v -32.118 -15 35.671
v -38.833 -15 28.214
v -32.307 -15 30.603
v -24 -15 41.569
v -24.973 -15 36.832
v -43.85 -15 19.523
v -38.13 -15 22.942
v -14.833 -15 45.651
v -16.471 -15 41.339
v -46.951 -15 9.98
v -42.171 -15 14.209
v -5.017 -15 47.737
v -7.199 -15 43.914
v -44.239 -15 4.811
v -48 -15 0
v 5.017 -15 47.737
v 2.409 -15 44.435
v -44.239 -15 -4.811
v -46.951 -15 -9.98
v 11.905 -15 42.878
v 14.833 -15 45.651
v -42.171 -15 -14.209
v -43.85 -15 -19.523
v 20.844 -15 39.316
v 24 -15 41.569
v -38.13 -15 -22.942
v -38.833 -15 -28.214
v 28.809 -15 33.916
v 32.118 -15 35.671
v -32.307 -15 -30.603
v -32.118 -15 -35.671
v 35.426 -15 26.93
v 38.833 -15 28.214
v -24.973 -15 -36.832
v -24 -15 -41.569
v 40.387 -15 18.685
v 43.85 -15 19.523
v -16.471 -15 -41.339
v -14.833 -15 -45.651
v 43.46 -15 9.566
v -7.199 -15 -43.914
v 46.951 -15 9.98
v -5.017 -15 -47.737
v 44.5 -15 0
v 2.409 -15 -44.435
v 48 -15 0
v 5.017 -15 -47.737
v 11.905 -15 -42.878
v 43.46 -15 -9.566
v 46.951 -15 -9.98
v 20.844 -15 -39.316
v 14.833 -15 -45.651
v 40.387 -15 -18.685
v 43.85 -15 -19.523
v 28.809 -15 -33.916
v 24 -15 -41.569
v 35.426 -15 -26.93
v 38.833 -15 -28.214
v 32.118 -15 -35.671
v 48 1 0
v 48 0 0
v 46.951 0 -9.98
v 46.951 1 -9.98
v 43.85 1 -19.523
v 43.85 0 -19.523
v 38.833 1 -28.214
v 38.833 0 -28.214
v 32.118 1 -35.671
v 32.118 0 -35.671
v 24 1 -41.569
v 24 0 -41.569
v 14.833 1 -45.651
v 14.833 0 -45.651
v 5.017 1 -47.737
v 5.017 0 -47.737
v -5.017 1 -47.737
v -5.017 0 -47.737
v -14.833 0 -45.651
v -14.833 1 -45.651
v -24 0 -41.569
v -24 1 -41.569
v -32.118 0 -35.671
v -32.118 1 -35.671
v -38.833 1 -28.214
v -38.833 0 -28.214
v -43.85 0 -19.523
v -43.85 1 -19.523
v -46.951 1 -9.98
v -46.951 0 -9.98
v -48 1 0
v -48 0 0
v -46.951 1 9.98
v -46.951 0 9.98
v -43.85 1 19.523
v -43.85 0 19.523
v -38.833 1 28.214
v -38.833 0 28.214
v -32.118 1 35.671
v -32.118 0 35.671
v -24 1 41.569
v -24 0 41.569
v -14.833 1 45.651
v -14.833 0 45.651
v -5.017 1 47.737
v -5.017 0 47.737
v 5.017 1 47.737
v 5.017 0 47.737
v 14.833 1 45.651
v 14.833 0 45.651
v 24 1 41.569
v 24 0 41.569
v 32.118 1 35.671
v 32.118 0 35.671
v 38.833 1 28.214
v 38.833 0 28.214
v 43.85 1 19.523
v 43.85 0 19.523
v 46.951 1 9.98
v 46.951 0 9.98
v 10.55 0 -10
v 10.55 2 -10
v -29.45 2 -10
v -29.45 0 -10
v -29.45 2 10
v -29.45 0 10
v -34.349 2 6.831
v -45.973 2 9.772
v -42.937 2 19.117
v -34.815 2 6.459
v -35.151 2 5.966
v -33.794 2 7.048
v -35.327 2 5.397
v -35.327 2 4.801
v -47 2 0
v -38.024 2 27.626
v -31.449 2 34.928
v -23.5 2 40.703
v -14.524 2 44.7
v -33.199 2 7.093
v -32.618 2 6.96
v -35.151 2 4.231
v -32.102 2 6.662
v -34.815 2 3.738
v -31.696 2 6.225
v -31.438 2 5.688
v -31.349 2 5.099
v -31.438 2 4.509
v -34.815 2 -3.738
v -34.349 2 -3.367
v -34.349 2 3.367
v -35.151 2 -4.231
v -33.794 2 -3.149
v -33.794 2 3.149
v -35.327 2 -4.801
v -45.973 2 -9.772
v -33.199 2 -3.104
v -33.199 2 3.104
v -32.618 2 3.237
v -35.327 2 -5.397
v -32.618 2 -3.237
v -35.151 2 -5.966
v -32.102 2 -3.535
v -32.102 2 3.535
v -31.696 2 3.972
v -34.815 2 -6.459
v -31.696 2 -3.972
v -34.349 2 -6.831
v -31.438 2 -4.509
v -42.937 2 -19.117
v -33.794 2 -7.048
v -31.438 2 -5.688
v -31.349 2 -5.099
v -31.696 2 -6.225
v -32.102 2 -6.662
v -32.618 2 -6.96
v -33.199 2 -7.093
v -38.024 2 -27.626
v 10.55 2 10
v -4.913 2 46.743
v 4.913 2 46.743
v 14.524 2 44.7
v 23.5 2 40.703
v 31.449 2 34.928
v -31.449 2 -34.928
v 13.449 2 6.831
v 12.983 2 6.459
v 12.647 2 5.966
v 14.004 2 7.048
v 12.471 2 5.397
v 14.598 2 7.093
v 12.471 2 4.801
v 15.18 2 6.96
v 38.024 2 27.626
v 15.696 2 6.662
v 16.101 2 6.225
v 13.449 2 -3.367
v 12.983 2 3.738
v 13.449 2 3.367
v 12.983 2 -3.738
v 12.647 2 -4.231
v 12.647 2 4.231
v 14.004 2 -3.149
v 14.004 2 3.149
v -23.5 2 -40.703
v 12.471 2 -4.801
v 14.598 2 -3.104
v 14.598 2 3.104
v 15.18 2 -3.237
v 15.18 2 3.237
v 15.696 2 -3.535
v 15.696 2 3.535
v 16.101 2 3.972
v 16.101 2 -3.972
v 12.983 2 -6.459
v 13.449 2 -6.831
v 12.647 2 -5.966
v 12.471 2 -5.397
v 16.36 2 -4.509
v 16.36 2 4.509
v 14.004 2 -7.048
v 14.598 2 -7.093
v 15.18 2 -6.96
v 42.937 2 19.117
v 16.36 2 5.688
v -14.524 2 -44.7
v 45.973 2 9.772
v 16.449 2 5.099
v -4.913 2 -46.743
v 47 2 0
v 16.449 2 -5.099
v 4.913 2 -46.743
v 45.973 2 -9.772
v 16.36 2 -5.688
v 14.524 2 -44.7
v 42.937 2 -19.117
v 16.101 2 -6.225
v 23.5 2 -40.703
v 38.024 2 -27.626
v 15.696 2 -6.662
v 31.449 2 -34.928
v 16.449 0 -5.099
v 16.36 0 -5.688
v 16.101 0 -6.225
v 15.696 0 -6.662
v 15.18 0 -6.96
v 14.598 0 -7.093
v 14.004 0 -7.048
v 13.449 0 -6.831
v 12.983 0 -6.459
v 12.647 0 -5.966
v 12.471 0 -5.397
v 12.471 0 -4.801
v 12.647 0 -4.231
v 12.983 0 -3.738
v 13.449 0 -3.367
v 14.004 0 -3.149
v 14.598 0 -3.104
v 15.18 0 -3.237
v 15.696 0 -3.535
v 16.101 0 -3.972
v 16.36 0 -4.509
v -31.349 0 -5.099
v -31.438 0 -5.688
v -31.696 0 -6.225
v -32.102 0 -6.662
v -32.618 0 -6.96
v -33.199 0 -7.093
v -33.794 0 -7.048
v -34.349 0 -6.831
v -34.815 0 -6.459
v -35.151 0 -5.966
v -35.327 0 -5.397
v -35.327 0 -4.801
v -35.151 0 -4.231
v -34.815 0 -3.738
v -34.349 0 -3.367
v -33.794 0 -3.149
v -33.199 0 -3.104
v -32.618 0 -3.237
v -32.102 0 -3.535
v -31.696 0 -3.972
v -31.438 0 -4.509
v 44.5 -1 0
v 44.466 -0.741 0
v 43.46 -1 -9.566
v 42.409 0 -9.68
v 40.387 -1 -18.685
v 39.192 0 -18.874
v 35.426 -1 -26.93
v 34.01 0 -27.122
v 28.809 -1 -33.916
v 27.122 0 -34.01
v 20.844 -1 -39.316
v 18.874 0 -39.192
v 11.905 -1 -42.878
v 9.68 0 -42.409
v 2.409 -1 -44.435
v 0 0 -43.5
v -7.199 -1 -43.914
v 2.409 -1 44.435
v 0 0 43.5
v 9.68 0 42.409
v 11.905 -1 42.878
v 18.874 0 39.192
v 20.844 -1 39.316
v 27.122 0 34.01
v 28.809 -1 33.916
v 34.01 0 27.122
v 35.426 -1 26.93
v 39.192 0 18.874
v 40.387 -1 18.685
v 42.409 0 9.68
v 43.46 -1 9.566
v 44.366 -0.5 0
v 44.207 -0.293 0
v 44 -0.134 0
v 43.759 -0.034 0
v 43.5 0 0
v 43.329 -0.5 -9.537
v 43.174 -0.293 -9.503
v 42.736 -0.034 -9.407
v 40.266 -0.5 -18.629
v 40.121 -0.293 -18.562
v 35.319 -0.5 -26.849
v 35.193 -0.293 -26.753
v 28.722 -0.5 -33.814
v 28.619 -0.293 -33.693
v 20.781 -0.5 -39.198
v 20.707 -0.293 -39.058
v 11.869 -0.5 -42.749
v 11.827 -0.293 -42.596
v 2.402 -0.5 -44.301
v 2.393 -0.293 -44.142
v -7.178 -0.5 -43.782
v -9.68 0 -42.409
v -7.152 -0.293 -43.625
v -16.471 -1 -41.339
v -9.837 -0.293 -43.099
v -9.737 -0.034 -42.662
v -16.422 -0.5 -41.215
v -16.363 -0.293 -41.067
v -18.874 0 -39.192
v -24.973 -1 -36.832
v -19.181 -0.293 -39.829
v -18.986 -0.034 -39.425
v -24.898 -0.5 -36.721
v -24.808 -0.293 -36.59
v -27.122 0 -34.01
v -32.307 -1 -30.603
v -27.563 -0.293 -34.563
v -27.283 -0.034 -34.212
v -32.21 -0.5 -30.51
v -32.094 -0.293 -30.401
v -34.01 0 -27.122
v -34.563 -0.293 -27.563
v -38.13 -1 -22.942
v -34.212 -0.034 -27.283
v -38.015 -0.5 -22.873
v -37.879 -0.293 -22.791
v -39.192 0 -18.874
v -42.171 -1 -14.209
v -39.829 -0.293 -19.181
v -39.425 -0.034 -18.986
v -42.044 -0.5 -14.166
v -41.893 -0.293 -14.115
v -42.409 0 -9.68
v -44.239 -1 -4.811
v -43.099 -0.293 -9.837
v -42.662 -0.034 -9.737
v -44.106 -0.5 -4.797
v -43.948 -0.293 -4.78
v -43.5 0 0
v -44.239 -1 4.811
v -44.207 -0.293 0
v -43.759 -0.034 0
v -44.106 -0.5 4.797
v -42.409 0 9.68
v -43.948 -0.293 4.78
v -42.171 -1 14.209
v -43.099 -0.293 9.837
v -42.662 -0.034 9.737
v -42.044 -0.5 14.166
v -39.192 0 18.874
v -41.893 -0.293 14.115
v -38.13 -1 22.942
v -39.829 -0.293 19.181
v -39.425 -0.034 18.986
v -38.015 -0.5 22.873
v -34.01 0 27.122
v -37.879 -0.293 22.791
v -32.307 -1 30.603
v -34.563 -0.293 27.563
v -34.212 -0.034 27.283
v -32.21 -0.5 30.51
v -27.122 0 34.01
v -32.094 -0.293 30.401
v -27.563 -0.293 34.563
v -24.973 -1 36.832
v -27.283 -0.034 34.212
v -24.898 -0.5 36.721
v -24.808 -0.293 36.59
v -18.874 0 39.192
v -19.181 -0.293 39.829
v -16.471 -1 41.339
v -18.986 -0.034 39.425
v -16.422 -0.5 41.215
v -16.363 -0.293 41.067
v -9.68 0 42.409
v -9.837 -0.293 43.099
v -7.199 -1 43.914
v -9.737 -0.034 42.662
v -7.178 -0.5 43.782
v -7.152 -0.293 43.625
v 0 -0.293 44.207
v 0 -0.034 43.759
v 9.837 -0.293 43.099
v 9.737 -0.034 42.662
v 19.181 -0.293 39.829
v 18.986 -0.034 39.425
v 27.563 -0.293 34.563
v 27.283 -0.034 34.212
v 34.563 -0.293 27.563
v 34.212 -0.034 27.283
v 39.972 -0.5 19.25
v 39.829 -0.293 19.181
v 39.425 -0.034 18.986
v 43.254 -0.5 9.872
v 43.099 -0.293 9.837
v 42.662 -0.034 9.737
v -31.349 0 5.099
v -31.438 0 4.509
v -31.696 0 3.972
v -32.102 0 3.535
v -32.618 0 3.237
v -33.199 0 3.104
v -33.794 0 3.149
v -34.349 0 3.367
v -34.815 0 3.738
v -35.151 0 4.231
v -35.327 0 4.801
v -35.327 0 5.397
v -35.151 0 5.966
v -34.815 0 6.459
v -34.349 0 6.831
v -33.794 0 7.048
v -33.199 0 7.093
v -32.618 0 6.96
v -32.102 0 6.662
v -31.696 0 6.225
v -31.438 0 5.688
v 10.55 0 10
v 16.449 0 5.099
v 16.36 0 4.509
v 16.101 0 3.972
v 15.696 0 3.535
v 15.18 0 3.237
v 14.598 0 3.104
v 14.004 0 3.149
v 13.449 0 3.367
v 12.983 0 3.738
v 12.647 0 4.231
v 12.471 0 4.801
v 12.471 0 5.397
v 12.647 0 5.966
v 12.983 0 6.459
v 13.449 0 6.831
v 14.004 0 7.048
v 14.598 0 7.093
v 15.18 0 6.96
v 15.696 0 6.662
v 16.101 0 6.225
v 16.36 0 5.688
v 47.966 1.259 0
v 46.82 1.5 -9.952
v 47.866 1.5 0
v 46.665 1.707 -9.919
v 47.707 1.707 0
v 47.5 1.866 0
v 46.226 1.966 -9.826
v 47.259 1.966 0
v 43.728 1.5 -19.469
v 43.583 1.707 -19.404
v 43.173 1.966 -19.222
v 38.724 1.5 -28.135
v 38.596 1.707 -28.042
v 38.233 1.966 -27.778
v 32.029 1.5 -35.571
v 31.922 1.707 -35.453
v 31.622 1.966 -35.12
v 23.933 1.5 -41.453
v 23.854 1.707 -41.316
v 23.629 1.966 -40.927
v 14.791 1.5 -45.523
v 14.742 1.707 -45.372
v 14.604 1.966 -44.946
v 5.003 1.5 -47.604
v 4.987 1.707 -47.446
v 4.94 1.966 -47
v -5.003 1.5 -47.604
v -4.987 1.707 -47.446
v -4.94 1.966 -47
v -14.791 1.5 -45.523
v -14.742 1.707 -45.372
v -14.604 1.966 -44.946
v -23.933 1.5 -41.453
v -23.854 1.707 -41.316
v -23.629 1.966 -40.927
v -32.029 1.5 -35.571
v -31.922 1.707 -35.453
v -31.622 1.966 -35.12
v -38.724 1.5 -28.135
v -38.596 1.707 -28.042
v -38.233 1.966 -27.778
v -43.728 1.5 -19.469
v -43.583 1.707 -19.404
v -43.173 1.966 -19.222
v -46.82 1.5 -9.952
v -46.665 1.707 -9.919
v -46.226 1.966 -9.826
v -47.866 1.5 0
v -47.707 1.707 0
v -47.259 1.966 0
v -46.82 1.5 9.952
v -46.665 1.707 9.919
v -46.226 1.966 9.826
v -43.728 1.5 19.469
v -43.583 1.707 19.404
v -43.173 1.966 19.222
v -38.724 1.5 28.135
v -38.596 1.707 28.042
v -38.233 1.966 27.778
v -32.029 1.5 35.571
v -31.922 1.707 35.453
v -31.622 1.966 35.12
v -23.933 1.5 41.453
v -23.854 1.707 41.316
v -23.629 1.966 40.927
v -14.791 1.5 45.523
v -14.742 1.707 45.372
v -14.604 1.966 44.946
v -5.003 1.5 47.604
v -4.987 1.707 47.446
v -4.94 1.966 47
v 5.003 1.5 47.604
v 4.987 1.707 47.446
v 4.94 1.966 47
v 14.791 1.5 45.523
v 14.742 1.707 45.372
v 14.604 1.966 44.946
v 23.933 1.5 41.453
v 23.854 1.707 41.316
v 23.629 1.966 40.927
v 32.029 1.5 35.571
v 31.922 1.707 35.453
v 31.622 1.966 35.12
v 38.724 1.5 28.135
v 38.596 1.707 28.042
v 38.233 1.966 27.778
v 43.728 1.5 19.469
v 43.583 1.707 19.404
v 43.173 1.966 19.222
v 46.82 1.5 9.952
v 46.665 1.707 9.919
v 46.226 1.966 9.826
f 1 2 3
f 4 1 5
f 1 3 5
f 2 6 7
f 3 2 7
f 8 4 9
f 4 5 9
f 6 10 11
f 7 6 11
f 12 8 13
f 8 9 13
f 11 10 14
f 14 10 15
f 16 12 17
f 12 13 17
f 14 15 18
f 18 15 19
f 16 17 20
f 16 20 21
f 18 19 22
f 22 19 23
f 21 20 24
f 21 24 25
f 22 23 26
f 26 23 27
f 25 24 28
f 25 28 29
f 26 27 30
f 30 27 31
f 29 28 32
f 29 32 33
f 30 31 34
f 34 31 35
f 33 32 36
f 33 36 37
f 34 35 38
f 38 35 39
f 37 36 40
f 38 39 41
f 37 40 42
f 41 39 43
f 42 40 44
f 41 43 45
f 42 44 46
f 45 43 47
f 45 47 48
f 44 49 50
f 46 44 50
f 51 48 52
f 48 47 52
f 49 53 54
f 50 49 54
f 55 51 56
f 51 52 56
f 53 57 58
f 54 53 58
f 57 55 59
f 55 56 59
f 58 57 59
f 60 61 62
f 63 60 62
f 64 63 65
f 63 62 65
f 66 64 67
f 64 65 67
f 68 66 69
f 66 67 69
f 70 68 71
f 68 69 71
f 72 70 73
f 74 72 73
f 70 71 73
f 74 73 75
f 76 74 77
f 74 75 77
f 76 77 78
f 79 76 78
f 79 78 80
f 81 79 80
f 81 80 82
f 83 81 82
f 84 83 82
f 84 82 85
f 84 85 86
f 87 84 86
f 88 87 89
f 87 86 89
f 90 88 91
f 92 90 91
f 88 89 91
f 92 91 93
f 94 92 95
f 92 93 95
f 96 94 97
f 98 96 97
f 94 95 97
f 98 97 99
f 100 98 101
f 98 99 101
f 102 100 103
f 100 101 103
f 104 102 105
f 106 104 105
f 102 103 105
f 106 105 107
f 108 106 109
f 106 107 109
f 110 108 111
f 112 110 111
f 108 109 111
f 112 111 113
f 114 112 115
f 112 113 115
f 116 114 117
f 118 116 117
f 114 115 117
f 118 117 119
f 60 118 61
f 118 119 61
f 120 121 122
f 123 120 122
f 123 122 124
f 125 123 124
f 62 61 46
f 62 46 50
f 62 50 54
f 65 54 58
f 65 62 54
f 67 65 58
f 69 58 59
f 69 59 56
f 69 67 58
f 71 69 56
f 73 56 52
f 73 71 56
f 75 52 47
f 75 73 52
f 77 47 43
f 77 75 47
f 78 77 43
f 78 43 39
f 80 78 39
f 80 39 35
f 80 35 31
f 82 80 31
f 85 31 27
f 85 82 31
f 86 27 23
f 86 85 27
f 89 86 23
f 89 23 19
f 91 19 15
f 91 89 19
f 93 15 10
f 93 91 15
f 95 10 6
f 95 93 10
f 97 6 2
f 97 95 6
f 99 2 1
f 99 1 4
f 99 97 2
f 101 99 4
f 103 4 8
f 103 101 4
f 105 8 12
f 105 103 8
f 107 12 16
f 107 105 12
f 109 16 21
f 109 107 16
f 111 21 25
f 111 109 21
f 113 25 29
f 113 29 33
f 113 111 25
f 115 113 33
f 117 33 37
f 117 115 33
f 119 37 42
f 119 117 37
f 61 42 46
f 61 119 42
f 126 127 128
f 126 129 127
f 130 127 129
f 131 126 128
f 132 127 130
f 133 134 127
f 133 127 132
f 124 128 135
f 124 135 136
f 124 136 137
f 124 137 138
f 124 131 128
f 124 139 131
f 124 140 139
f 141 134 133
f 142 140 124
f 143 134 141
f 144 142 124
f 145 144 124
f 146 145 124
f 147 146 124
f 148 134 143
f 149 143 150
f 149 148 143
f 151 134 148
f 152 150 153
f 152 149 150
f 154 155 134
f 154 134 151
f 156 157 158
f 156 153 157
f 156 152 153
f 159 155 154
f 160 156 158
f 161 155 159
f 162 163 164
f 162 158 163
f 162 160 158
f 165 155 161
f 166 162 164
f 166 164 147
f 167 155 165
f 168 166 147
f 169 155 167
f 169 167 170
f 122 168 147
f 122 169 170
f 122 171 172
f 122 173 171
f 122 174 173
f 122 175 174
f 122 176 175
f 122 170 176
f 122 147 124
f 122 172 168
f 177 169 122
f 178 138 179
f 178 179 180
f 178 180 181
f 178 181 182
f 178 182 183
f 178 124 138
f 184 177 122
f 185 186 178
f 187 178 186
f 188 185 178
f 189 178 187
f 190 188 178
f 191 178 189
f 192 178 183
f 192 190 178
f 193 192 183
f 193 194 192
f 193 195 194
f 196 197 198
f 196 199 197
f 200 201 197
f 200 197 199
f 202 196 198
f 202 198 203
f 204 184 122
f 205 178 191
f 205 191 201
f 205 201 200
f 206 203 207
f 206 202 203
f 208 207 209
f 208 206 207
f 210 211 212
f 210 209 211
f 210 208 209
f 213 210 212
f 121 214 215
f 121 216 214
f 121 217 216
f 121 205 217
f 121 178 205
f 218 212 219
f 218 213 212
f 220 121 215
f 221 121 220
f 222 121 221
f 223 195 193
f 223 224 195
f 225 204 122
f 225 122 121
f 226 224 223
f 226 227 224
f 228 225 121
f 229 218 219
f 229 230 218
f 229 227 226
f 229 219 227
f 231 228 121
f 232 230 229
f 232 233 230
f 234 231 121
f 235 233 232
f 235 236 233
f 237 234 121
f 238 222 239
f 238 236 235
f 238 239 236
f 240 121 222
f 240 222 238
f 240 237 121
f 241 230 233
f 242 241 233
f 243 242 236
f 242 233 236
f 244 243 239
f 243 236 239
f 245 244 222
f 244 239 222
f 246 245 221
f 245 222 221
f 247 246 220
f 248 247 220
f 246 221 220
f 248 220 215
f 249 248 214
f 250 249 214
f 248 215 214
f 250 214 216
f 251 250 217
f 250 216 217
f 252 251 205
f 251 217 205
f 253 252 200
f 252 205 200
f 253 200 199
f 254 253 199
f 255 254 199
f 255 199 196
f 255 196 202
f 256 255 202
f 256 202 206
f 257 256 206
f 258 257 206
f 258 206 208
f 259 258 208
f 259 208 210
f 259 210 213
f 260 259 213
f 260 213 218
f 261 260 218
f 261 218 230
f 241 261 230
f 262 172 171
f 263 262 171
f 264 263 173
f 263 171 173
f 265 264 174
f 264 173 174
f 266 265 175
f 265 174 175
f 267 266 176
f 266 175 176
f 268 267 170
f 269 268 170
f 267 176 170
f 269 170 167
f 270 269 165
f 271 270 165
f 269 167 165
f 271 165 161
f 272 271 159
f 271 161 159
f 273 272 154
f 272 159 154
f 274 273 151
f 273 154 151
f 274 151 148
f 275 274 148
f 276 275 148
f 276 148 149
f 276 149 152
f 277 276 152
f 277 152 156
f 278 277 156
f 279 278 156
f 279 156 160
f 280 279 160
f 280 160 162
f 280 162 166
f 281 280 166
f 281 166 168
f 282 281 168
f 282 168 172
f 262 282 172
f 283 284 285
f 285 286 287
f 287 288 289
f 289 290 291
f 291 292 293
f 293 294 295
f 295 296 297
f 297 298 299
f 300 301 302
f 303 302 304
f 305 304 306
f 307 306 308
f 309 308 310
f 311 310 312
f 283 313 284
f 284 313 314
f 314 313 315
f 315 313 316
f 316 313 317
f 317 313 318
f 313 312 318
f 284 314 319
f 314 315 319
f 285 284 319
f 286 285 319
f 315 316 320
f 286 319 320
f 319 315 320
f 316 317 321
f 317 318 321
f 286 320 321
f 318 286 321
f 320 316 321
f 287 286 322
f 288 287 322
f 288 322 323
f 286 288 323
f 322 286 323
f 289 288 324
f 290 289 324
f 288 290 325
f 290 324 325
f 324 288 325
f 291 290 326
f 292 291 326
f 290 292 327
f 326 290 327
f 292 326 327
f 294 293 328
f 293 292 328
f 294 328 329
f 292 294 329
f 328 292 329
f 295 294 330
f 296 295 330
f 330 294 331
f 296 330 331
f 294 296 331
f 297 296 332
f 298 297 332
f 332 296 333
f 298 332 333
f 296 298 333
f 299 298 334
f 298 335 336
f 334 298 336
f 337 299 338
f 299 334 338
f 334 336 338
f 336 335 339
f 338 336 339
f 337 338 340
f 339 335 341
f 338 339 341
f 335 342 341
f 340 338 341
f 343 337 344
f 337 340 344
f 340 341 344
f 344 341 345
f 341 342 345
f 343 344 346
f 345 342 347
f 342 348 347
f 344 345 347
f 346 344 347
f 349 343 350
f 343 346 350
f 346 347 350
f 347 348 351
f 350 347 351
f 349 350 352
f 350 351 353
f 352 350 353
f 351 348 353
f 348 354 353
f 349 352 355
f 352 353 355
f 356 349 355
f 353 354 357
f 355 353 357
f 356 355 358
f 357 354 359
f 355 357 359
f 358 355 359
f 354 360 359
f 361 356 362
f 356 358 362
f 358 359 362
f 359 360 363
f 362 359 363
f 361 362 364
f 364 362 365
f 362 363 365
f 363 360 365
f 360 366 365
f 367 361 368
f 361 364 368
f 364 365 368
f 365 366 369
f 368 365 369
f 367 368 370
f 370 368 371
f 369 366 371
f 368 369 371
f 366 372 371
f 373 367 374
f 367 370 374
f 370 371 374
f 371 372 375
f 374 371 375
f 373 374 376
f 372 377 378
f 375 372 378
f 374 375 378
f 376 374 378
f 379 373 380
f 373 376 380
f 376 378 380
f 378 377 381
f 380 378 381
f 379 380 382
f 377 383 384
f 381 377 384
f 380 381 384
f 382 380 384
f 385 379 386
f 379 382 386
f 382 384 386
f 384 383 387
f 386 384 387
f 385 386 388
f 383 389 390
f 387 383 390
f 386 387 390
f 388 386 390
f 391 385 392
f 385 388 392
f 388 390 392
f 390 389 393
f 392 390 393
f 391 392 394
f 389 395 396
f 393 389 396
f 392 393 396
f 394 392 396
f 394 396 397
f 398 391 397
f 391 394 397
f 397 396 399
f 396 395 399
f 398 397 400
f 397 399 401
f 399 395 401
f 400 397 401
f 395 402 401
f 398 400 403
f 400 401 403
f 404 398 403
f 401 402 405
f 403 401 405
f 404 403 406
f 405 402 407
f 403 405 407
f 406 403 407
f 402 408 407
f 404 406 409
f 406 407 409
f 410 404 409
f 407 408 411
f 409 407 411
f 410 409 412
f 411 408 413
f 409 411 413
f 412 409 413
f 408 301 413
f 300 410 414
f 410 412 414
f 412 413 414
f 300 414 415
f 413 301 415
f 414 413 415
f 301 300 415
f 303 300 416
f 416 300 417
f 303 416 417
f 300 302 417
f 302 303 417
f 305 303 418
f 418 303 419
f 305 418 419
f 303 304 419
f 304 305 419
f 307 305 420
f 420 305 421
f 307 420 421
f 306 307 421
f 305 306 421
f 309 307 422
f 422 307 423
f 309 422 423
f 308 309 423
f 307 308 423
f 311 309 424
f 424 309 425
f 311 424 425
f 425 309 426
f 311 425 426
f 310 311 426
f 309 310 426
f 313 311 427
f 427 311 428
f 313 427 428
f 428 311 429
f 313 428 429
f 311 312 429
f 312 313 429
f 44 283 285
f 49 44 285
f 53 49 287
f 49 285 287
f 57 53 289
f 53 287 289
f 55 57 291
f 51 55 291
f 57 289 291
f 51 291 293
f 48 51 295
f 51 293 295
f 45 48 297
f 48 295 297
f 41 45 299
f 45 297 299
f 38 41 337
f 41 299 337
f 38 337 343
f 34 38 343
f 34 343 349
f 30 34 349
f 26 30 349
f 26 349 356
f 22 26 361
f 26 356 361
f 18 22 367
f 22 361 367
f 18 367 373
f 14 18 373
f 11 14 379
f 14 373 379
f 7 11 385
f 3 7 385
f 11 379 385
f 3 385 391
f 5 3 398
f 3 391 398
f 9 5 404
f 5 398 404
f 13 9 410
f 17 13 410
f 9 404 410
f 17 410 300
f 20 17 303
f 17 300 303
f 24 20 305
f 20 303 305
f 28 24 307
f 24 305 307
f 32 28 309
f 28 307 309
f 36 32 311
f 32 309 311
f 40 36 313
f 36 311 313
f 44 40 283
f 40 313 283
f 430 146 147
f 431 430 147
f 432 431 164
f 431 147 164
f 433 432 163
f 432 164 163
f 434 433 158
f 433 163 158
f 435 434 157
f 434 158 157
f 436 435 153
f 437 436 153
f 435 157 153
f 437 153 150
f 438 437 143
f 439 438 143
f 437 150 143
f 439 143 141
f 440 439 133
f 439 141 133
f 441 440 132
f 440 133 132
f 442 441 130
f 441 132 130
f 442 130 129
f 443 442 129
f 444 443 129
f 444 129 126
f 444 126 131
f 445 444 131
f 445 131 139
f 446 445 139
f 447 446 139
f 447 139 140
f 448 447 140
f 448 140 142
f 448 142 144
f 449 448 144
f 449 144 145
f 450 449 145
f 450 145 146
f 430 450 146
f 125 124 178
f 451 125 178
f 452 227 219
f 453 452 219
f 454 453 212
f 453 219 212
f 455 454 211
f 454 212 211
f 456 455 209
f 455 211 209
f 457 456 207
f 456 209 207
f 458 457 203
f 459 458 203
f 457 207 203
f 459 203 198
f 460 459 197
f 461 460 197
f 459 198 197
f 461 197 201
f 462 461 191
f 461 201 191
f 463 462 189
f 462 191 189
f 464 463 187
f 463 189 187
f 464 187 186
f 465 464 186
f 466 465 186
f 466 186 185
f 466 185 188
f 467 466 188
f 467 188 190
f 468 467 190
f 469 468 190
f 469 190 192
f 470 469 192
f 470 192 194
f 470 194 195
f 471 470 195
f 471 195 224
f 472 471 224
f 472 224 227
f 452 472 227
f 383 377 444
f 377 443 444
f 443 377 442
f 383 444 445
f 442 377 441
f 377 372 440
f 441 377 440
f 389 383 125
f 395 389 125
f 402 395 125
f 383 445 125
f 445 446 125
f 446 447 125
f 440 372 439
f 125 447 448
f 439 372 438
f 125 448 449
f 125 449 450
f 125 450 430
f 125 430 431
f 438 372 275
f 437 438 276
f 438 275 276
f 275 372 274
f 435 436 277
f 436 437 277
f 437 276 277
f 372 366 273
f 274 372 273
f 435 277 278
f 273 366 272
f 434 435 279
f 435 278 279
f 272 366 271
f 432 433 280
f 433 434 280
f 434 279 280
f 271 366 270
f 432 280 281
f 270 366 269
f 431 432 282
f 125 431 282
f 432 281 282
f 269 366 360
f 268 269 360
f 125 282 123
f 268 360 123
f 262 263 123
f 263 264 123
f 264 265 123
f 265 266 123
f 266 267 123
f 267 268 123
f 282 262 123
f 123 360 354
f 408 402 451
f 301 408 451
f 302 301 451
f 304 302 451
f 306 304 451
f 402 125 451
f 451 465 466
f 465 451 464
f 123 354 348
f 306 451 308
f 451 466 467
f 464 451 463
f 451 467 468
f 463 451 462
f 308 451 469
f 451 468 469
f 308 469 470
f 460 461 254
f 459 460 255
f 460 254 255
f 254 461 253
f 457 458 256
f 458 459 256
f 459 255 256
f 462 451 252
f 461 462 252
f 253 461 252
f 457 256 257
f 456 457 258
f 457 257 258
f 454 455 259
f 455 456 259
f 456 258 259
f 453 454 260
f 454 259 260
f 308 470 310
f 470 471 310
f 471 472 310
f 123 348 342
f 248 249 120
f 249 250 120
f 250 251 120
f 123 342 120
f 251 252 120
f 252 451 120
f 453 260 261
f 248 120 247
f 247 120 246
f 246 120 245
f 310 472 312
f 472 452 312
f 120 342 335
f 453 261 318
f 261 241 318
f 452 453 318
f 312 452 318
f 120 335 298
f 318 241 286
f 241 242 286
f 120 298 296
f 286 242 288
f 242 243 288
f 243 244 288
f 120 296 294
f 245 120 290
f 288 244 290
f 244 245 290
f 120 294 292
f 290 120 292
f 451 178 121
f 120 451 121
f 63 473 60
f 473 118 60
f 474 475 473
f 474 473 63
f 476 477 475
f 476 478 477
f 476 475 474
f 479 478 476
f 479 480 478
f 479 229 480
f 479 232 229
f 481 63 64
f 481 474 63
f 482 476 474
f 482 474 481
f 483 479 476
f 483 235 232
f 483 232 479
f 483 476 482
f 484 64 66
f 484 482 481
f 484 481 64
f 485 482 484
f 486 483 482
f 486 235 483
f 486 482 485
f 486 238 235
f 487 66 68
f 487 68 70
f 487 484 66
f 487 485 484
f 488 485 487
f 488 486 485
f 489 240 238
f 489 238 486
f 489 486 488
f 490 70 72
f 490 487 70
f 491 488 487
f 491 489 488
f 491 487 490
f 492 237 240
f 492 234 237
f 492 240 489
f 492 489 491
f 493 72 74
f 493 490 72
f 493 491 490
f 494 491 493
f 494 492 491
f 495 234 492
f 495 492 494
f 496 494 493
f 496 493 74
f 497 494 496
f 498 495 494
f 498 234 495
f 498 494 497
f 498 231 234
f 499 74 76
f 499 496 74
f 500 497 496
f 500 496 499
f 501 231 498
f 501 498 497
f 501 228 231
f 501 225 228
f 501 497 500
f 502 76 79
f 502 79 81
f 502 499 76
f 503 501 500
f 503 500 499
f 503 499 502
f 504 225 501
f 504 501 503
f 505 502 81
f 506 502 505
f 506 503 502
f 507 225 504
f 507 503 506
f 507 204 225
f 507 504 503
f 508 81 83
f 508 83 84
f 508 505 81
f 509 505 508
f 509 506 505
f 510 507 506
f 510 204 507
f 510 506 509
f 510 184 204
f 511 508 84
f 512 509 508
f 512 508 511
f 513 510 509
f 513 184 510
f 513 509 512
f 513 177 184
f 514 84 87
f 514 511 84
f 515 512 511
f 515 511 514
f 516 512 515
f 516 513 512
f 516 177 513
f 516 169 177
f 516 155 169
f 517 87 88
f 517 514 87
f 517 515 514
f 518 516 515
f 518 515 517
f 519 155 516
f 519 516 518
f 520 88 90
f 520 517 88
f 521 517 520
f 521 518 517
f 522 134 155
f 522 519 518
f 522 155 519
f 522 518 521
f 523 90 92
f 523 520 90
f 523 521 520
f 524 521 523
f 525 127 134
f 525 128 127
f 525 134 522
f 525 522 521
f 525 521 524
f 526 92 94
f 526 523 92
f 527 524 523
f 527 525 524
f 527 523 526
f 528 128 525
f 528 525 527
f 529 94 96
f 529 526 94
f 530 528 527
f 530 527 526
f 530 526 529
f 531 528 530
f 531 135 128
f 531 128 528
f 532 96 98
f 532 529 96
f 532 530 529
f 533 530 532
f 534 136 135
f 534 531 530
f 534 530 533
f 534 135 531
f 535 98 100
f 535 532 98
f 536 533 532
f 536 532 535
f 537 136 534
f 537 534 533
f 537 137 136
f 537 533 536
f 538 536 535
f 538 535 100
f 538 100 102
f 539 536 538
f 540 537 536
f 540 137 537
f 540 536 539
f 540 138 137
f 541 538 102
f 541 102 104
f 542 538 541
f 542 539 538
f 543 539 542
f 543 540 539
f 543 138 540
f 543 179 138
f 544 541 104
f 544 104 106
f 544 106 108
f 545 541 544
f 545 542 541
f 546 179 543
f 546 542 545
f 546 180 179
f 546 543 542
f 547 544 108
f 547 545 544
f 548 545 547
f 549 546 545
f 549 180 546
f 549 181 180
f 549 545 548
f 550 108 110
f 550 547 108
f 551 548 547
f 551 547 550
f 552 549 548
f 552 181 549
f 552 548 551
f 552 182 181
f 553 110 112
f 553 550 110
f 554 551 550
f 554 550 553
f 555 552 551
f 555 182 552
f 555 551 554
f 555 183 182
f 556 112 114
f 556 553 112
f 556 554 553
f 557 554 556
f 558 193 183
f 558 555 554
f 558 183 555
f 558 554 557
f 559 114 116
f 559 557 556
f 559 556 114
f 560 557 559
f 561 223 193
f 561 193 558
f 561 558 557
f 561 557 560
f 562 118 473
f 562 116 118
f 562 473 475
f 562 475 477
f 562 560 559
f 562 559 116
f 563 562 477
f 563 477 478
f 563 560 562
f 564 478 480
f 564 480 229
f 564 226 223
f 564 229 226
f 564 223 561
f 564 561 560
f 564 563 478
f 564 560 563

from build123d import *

# Parameters (mm, degrees)
SKETCH1_R           = 48
SKETCH1_R_2         = 44.5
BOSS_EXTRUDE3_DEPTH = 15
BOSS_EXTRUDE4_START = 2
SKETCH1_5_R         = 48
BOSS_EXTRUDE4_DEPTH = 2
FILLET1_R           = 1
CUT_EXTRUDE1_DEPTH  = 30
SKETCH4_R           = 2
CUT_EXTRUDE2_DEPTH  = 10


with BuildPart() as part:
    # Sketch1 → Boss-Extrude3 (new body)
    with BuildSketch(Plane(origin=(0, 0, 0), x_dir=(1, 0, 0), z_dir=(0, 1, 0))):
        Circle(SKETCH1_R)
        Circle(SKETCH1_R_2, mode=Mode.SUBTRACT)
    extrude(amount=-BOSS_EXTRUDE3_DEPTH)

    # Sketch1<5> → Boss-Extrude4 (add)
    with BuildSketch(Plane(origin=(0, 0, 0), x_dir=(1, 0, 0), z_dir=(0, 1, 0)).offset(BOSS_EXTRUDE4_START)):
        Circle(SKETCH1_5_R)
    extrude(amount=-BOSS_EXTRUDE4_DEPTH)

    # Fillet1
    fillet1_edges = [part.edges().sort_by_distance(p)[0] for p in [
        (-44.5, 0, 0),
        (-48, 2, 0),
    ]]
    fillet(fillet1_edges, radius=FILLET1_R)

    # Sketch3 → Cut-Extrude1 (cut)
    with BuildSketch(Plane(origin=(0, 2, 0), x_dir=(1, 0, 0), z_dir=(0, 1, 0))):
        Polygon((-29.45, 10), (-29.45, 0), (-29.45, -10), (10.55, -10), (10.55, 10), align=None)
    extrude(amount=-CUT_EXTRUDE1_DEPTH, mode=Mode.SUBTRACT)

    # Sketch4 → Cut-Extrude2 (cut)
    with BuildSketch(Plane(origin=(0, 2, 0), x_dir=(1, 0, 0), z_dir=(0, 1, 0))):
        with Locations((-33.34886579, -5.09860841)):
            Circle(SKETCH4_R)
        with Locations((14.44886579, -5.09860841)):
            Circle(SKETCH4_R)
        with Locations((14.44886579, 5.09860841)):
            Circle(SKETCH4_R)
        with Locations((-33.34886579, 5.09860841)):
            Circle(SKETCH4_R)
    extrude(amount=-CUT_EXTRUDE2_DEPTH, mode=Mode.SUBTRACT)


solid = part.part
